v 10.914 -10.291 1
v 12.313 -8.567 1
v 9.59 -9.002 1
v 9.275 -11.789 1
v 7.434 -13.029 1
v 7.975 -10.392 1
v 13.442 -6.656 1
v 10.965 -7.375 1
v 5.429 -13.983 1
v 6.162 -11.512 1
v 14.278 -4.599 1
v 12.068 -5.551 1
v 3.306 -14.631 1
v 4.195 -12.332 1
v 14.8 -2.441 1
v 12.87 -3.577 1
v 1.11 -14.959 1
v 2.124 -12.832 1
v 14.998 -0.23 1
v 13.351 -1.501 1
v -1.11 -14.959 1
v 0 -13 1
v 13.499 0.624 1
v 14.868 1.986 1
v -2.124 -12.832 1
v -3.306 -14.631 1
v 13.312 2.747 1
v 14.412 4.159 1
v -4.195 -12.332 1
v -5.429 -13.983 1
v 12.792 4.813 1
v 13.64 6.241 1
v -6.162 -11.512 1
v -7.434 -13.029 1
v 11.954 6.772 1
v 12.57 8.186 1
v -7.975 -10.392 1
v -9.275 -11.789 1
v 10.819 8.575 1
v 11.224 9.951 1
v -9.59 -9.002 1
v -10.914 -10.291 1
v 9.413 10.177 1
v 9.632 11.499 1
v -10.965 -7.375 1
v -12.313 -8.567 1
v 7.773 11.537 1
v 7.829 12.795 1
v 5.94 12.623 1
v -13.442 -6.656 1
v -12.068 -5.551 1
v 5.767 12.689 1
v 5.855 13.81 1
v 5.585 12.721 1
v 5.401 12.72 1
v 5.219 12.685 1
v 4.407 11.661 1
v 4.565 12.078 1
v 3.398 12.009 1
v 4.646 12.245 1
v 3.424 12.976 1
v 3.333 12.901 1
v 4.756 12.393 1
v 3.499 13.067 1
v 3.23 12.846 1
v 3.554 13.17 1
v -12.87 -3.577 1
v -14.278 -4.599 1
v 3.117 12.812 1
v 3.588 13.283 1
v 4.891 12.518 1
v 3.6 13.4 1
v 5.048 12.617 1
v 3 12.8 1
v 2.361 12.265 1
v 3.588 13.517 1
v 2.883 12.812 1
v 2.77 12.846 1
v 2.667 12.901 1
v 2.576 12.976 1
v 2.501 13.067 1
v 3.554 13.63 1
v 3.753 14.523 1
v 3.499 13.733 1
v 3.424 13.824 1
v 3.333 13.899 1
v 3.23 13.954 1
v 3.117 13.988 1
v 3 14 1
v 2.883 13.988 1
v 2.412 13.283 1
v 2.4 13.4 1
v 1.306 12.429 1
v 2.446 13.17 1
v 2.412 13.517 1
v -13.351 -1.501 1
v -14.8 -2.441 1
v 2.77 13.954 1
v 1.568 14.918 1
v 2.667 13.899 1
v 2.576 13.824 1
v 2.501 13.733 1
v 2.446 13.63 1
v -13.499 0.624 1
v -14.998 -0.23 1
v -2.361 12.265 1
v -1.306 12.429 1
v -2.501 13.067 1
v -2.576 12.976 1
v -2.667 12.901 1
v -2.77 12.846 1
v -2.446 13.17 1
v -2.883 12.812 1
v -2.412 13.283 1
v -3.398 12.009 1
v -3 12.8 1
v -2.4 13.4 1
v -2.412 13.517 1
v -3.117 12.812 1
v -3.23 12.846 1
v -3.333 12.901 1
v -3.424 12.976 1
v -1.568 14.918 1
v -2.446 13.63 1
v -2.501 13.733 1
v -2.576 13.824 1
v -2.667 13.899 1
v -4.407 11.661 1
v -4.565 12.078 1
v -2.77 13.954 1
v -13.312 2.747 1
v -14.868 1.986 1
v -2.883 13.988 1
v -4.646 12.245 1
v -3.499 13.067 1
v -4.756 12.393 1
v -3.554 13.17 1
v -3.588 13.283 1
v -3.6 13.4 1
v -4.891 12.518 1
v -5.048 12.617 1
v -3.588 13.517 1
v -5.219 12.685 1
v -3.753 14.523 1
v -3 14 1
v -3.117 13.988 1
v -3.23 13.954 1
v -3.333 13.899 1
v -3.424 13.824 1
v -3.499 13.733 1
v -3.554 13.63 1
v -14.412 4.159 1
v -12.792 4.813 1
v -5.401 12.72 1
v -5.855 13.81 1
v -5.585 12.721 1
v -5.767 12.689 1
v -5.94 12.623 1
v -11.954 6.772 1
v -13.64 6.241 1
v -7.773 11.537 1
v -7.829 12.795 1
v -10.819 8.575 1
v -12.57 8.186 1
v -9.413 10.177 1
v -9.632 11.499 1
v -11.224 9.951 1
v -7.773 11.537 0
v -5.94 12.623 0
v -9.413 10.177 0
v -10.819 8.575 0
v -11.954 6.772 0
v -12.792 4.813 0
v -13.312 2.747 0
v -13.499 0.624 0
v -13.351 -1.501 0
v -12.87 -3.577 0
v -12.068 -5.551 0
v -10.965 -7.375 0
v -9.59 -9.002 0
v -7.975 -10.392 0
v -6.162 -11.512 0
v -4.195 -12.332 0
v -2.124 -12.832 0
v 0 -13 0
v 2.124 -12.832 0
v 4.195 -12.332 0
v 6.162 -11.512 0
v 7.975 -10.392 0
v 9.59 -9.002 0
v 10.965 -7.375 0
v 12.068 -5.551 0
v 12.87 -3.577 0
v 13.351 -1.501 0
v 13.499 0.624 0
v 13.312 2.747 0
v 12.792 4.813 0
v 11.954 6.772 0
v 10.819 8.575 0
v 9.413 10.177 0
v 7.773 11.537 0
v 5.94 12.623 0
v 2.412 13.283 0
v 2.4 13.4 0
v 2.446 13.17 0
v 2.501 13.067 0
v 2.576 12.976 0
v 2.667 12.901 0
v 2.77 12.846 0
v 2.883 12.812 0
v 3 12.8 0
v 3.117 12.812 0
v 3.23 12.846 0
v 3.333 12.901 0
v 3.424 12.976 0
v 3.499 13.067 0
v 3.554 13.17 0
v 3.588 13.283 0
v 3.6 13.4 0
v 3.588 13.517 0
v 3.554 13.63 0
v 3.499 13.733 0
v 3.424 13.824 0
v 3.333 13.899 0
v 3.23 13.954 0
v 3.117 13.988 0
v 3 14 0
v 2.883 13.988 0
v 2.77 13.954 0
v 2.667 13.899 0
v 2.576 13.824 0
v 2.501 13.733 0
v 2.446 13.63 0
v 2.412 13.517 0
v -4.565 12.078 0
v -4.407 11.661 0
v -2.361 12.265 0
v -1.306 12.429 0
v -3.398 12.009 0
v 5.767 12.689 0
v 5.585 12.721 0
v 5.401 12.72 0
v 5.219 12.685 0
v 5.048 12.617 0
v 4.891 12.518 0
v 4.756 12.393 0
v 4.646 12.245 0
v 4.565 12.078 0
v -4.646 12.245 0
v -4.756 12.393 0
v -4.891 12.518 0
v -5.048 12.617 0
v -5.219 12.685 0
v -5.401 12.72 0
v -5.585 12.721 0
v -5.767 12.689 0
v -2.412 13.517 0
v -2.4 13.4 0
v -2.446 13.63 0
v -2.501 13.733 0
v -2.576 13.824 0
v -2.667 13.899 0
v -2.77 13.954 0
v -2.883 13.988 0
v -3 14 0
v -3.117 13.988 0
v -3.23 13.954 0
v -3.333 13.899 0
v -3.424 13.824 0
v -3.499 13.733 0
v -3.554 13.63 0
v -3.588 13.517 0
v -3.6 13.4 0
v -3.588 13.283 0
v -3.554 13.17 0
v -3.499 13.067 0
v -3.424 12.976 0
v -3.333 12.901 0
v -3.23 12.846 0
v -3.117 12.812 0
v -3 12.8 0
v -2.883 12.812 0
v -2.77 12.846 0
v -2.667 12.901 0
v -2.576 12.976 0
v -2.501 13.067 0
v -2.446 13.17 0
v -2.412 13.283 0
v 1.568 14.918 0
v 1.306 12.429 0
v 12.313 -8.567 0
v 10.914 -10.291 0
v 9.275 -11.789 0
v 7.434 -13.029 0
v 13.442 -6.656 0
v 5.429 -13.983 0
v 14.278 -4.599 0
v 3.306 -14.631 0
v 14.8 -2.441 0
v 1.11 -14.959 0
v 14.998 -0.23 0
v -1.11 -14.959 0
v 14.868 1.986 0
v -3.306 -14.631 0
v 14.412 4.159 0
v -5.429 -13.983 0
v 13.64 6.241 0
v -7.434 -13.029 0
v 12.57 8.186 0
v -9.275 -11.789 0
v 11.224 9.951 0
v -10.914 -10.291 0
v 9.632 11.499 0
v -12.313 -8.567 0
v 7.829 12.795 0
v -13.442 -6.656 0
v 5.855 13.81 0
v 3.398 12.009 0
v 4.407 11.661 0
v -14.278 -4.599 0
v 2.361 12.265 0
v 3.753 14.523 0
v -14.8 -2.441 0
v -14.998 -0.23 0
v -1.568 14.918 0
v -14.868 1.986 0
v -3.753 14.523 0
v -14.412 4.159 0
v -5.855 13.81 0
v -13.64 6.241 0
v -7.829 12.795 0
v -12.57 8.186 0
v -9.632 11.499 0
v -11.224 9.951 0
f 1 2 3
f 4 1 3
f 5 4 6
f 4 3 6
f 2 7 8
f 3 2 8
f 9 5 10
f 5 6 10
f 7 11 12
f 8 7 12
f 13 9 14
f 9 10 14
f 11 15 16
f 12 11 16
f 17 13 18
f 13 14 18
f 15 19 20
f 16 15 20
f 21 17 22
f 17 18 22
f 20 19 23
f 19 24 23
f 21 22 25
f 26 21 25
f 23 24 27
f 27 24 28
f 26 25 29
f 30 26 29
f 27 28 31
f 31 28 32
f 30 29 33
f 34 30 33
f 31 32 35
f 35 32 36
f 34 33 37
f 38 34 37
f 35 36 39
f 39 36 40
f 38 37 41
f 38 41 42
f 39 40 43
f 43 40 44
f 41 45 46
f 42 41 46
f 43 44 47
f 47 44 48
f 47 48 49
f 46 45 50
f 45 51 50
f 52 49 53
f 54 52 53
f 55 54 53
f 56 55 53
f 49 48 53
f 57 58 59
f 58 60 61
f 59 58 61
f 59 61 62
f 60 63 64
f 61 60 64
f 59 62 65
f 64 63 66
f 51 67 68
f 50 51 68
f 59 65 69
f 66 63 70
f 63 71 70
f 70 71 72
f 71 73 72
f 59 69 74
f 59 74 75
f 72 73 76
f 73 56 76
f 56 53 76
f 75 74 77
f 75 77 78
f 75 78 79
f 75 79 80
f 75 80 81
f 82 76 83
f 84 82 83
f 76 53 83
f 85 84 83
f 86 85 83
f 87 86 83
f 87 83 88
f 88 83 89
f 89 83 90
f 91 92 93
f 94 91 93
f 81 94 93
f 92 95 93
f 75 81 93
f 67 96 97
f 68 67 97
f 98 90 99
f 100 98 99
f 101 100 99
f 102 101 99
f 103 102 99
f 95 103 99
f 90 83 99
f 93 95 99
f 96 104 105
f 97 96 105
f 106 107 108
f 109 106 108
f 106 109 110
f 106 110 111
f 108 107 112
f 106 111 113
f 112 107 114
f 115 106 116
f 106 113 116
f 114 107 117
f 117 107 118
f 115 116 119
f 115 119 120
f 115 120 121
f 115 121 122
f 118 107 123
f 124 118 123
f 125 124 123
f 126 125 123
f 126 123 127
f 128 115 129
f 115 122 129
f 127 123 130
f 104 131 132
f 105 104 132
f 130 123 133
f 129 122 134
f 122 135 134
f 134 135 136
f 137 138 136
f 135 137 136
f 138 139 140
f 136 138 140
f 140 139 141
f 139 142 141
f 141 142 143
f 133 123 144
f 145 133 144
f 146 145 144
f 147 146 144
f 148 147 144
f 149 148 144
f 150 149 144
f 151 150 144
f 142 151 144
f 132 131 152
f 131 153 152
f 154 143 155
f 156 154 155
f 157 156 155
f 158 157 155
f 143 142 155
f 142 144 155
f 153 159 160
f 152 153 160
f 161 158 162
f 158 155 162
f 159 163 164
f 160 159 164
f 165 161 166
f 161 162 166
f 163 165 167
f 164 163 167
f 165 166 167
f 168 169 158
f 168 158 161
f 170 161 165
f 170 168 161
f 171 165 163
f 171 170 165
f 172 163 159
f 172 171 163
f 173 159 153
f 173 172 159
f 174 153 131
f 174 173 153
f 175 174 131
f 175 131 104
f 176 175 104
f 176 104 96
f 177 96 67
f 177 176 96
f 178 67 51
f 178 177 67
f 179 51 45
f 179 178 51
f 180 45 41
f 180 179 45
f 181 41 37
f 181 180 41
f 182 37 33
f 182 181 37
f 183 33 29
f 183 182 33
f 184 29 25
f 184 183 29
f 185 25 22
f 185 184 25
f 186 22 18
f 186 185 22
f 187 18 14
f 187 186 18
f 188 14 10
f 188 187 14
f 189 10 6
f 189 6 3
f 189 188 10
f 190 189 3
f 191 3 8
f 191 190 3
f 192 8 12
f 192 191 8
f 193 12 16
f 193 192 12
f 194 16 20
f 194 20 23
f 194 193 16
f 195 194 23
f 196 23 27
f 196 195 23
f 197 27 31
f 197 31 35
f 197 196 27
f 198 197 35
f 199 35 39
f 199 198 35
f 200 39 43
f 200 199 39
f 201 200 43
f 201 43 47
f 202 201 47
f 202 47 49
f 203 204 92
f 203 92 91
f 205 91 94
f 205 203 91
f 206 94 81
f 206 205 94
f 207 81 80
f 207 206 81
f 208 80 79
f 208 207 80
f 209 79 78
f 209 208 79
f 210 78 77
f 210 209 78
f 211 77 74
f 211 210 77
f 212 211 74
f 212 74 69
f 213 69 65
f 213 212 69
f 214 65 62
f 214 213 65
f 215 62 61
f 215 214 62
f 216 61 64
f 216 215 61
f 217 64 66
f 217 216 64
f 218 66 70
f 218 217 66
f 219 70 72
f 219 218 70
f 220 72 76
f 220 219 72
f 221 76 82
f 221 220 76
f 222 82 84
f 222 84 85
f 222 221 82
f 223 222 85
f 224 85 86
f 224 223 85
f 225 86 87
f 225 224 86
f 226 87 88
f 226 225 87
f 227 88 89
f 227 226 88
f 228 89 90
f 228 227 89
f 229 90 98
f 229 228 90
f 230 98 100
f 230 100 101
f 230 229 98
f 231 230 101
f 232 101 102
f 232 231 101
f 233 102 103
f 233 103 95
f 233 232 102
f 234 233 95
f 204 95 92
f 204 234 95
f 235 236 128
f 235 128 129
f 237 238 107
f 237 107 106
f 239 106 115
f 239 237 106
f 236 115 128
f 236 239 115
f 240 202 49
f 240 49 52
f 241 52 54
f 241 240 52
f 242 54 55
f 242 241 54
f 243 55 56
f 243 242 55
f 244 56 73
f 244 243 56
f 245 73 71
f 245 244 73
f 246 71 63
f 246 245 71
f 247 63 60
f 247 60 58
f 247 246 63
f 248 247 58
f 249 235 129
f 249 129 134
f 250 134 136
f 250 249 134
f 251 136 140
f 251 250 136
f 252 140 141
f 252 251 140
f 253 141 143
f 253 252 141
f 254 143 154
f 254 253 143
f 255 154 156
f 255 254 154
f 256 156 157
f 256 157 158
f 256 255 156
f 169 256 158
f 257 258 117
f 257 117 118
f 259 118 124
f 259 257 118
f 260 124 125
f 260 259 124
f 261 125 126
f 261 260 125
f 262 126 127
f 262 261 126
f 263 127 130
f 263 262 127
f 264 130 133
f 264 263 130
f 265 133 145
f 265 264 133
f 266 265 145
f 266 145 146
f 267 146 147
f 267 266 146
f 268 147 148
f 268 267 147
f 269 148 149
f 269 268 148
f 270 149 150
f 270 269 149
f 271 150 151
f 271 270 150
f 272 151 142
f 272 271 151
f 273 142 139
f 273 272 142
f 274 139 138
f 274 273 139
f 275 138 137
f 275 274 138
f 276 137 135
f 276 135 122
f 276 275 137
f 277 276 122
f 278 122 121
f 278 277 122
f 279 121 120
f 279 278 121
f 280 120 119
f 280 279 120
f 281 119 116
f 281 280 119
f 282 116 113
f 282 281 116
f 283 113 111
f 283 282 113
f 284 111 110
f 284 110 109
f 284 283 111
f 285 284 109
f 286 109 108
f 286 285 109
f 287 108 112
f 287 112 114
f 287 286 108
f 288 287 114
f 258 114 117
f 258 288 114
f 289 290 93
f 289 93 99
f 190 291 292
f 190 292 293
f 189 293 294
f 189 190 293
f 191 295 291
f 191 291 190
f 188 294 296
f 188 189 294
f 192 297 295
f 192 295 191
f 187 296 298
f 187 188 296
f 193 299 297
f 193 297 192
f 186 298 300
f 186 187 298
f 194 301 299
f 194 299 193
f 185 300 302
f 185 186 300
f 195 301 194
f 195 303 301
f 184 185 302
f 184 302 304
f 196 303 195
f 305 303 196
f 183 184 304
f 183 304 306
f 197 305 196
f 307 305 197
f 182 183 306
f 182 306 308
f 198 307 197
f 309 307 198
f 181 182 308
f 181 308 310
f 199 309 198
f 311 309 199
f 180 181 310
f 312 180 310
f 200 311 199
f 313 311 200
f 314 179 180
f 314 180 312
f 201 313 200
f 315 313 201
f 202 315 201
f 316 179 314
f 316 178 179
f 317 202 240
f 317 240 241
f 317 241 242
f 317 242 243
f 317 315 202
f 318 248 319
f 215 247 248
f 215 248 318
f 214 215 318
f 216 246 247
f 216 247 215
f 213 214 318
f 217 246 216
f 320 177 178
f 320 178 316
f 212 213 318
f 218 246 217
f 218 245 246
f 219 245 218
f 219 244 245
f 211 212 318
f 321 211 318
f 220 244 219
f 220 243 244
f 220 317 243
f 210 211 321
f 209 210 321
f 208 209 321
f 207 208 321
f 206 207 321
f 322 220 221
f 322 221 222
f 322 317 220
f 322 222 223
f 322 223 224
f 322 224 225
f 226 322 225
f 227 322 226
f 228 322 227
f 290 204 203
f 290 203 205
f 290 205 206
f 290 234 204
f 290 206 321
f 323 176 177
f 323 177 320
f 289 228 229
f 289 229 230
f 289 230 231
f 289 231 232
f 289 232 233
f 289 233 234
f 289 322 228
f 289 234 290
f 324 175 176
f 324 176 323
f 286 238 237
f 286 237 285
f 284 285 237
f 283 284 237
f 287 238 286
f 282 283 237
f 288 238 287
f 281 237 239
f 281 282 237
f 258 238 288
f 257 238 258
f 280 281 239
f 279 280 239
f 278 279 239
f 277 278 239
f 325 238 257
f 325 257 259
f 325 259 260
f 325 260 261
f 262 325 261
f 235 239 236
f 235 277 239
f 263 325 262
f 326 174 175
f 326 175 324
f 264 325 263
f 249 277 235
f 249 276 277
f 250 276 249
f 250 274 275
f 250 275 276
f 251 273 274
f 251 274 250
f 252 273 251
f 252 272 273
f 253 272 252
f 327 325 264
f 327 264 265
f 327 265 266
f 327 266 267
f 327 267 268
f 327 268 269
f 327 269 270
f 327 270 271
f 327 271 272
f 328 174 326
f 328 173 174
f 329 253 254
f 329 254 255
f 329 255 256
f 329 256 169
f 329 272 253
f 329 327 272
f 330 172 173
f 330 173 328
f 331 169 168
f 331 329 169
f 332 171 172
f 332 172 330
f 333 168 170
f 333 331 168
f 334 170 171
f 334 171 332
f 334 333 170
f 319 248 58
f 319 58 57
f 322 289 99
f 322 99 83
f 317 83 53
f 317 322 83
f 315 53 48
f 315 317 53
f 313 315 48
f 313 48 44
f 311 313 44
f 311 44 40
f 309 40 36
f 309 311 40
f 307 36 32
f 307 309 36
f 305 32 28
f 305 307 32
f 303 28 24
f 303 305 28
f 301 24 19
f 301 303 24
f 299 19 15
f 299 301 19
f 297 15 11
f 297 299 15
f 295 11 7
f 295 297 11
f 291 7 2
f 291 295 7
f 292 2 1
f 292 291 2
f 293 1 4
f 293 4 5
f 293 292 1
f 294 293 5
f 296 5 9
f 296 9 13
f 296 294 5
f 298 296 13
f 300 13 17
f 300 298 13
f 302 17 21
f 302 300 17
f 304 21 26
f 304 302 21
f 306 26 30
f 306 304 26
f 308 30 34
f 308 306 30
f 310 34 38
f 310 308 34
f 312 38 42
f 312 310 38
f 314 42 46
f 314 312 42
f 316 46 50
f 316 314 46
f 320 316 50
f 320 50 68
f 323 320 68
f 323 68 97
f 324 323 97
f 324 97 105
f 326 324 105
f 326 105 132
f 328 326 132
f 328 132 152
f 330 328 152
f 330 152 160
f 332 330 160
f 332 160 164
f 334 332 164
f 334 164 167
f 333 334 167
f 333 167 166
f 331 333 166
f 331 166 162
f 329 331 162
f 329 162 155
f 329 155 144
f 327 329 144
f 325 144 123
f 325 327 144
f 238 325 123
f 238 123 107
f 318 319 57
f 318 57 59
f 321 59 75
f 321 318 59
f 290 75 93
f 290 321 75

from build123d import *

# Parameters (mm, degrees)
ESQUISSE1_R          = 0.6
BASE_EXTRUSION_DEPTH = 1


with BuildPart() as part:
    # Esquisse1 → Base-Extrusion (new body)
    with BuildSketch(Plane.XY):
        with BuildLine():
            Line((-4.406978672, 11.661475663), (-4.564568548, 12.078480291))
            ThreePointArc((-4.564568548, 12.078480291), (-5.131923481, 12.654767663), (-5.94, 12.622969933))
            ThreePointArc((-5.94, 12.622969933), (0, -13), (5.94, 12.622969933))
            ThreePointArc((5.94, 12.622969933), (5.131923481, 12.654767663), (4.564568548, 12.078480291))
            Line((4.564568548, 12.078480291), (4.406978672, 11.661475663))
            ThreePointArc((4.406978672, 11.661475663), (2.882284348, 12.148709668), (1.306307585, 12.428686453))
            Line((1.306307585, 12.428686453), (1.567926949, 14.917828431))
            ThreePointArc((1.567926949, 14.917828431), (0, -15), (-1.567926949, 14.917828431))
            Line((-1.567926949, 14.917828431), (-1.306307585, 12.428686453))
            ThreePointArc((-1.306307585, 12.428686453), (-2.882284348, 12.148709668), (-4.406978672, 11.661475663))
        make_face()
        with Locations((-3, 13.4)):
            Circle(ESQUISSE1_R, mode=Mode.SUBTRACT)
        with Locations((3, 13.4)):
            Circle(ESQUISSE1_R, mode=Mode.SUBTRACT)
    extrude(amount=BASE_EXTRUSION_DEPTH)


solid = part.part
